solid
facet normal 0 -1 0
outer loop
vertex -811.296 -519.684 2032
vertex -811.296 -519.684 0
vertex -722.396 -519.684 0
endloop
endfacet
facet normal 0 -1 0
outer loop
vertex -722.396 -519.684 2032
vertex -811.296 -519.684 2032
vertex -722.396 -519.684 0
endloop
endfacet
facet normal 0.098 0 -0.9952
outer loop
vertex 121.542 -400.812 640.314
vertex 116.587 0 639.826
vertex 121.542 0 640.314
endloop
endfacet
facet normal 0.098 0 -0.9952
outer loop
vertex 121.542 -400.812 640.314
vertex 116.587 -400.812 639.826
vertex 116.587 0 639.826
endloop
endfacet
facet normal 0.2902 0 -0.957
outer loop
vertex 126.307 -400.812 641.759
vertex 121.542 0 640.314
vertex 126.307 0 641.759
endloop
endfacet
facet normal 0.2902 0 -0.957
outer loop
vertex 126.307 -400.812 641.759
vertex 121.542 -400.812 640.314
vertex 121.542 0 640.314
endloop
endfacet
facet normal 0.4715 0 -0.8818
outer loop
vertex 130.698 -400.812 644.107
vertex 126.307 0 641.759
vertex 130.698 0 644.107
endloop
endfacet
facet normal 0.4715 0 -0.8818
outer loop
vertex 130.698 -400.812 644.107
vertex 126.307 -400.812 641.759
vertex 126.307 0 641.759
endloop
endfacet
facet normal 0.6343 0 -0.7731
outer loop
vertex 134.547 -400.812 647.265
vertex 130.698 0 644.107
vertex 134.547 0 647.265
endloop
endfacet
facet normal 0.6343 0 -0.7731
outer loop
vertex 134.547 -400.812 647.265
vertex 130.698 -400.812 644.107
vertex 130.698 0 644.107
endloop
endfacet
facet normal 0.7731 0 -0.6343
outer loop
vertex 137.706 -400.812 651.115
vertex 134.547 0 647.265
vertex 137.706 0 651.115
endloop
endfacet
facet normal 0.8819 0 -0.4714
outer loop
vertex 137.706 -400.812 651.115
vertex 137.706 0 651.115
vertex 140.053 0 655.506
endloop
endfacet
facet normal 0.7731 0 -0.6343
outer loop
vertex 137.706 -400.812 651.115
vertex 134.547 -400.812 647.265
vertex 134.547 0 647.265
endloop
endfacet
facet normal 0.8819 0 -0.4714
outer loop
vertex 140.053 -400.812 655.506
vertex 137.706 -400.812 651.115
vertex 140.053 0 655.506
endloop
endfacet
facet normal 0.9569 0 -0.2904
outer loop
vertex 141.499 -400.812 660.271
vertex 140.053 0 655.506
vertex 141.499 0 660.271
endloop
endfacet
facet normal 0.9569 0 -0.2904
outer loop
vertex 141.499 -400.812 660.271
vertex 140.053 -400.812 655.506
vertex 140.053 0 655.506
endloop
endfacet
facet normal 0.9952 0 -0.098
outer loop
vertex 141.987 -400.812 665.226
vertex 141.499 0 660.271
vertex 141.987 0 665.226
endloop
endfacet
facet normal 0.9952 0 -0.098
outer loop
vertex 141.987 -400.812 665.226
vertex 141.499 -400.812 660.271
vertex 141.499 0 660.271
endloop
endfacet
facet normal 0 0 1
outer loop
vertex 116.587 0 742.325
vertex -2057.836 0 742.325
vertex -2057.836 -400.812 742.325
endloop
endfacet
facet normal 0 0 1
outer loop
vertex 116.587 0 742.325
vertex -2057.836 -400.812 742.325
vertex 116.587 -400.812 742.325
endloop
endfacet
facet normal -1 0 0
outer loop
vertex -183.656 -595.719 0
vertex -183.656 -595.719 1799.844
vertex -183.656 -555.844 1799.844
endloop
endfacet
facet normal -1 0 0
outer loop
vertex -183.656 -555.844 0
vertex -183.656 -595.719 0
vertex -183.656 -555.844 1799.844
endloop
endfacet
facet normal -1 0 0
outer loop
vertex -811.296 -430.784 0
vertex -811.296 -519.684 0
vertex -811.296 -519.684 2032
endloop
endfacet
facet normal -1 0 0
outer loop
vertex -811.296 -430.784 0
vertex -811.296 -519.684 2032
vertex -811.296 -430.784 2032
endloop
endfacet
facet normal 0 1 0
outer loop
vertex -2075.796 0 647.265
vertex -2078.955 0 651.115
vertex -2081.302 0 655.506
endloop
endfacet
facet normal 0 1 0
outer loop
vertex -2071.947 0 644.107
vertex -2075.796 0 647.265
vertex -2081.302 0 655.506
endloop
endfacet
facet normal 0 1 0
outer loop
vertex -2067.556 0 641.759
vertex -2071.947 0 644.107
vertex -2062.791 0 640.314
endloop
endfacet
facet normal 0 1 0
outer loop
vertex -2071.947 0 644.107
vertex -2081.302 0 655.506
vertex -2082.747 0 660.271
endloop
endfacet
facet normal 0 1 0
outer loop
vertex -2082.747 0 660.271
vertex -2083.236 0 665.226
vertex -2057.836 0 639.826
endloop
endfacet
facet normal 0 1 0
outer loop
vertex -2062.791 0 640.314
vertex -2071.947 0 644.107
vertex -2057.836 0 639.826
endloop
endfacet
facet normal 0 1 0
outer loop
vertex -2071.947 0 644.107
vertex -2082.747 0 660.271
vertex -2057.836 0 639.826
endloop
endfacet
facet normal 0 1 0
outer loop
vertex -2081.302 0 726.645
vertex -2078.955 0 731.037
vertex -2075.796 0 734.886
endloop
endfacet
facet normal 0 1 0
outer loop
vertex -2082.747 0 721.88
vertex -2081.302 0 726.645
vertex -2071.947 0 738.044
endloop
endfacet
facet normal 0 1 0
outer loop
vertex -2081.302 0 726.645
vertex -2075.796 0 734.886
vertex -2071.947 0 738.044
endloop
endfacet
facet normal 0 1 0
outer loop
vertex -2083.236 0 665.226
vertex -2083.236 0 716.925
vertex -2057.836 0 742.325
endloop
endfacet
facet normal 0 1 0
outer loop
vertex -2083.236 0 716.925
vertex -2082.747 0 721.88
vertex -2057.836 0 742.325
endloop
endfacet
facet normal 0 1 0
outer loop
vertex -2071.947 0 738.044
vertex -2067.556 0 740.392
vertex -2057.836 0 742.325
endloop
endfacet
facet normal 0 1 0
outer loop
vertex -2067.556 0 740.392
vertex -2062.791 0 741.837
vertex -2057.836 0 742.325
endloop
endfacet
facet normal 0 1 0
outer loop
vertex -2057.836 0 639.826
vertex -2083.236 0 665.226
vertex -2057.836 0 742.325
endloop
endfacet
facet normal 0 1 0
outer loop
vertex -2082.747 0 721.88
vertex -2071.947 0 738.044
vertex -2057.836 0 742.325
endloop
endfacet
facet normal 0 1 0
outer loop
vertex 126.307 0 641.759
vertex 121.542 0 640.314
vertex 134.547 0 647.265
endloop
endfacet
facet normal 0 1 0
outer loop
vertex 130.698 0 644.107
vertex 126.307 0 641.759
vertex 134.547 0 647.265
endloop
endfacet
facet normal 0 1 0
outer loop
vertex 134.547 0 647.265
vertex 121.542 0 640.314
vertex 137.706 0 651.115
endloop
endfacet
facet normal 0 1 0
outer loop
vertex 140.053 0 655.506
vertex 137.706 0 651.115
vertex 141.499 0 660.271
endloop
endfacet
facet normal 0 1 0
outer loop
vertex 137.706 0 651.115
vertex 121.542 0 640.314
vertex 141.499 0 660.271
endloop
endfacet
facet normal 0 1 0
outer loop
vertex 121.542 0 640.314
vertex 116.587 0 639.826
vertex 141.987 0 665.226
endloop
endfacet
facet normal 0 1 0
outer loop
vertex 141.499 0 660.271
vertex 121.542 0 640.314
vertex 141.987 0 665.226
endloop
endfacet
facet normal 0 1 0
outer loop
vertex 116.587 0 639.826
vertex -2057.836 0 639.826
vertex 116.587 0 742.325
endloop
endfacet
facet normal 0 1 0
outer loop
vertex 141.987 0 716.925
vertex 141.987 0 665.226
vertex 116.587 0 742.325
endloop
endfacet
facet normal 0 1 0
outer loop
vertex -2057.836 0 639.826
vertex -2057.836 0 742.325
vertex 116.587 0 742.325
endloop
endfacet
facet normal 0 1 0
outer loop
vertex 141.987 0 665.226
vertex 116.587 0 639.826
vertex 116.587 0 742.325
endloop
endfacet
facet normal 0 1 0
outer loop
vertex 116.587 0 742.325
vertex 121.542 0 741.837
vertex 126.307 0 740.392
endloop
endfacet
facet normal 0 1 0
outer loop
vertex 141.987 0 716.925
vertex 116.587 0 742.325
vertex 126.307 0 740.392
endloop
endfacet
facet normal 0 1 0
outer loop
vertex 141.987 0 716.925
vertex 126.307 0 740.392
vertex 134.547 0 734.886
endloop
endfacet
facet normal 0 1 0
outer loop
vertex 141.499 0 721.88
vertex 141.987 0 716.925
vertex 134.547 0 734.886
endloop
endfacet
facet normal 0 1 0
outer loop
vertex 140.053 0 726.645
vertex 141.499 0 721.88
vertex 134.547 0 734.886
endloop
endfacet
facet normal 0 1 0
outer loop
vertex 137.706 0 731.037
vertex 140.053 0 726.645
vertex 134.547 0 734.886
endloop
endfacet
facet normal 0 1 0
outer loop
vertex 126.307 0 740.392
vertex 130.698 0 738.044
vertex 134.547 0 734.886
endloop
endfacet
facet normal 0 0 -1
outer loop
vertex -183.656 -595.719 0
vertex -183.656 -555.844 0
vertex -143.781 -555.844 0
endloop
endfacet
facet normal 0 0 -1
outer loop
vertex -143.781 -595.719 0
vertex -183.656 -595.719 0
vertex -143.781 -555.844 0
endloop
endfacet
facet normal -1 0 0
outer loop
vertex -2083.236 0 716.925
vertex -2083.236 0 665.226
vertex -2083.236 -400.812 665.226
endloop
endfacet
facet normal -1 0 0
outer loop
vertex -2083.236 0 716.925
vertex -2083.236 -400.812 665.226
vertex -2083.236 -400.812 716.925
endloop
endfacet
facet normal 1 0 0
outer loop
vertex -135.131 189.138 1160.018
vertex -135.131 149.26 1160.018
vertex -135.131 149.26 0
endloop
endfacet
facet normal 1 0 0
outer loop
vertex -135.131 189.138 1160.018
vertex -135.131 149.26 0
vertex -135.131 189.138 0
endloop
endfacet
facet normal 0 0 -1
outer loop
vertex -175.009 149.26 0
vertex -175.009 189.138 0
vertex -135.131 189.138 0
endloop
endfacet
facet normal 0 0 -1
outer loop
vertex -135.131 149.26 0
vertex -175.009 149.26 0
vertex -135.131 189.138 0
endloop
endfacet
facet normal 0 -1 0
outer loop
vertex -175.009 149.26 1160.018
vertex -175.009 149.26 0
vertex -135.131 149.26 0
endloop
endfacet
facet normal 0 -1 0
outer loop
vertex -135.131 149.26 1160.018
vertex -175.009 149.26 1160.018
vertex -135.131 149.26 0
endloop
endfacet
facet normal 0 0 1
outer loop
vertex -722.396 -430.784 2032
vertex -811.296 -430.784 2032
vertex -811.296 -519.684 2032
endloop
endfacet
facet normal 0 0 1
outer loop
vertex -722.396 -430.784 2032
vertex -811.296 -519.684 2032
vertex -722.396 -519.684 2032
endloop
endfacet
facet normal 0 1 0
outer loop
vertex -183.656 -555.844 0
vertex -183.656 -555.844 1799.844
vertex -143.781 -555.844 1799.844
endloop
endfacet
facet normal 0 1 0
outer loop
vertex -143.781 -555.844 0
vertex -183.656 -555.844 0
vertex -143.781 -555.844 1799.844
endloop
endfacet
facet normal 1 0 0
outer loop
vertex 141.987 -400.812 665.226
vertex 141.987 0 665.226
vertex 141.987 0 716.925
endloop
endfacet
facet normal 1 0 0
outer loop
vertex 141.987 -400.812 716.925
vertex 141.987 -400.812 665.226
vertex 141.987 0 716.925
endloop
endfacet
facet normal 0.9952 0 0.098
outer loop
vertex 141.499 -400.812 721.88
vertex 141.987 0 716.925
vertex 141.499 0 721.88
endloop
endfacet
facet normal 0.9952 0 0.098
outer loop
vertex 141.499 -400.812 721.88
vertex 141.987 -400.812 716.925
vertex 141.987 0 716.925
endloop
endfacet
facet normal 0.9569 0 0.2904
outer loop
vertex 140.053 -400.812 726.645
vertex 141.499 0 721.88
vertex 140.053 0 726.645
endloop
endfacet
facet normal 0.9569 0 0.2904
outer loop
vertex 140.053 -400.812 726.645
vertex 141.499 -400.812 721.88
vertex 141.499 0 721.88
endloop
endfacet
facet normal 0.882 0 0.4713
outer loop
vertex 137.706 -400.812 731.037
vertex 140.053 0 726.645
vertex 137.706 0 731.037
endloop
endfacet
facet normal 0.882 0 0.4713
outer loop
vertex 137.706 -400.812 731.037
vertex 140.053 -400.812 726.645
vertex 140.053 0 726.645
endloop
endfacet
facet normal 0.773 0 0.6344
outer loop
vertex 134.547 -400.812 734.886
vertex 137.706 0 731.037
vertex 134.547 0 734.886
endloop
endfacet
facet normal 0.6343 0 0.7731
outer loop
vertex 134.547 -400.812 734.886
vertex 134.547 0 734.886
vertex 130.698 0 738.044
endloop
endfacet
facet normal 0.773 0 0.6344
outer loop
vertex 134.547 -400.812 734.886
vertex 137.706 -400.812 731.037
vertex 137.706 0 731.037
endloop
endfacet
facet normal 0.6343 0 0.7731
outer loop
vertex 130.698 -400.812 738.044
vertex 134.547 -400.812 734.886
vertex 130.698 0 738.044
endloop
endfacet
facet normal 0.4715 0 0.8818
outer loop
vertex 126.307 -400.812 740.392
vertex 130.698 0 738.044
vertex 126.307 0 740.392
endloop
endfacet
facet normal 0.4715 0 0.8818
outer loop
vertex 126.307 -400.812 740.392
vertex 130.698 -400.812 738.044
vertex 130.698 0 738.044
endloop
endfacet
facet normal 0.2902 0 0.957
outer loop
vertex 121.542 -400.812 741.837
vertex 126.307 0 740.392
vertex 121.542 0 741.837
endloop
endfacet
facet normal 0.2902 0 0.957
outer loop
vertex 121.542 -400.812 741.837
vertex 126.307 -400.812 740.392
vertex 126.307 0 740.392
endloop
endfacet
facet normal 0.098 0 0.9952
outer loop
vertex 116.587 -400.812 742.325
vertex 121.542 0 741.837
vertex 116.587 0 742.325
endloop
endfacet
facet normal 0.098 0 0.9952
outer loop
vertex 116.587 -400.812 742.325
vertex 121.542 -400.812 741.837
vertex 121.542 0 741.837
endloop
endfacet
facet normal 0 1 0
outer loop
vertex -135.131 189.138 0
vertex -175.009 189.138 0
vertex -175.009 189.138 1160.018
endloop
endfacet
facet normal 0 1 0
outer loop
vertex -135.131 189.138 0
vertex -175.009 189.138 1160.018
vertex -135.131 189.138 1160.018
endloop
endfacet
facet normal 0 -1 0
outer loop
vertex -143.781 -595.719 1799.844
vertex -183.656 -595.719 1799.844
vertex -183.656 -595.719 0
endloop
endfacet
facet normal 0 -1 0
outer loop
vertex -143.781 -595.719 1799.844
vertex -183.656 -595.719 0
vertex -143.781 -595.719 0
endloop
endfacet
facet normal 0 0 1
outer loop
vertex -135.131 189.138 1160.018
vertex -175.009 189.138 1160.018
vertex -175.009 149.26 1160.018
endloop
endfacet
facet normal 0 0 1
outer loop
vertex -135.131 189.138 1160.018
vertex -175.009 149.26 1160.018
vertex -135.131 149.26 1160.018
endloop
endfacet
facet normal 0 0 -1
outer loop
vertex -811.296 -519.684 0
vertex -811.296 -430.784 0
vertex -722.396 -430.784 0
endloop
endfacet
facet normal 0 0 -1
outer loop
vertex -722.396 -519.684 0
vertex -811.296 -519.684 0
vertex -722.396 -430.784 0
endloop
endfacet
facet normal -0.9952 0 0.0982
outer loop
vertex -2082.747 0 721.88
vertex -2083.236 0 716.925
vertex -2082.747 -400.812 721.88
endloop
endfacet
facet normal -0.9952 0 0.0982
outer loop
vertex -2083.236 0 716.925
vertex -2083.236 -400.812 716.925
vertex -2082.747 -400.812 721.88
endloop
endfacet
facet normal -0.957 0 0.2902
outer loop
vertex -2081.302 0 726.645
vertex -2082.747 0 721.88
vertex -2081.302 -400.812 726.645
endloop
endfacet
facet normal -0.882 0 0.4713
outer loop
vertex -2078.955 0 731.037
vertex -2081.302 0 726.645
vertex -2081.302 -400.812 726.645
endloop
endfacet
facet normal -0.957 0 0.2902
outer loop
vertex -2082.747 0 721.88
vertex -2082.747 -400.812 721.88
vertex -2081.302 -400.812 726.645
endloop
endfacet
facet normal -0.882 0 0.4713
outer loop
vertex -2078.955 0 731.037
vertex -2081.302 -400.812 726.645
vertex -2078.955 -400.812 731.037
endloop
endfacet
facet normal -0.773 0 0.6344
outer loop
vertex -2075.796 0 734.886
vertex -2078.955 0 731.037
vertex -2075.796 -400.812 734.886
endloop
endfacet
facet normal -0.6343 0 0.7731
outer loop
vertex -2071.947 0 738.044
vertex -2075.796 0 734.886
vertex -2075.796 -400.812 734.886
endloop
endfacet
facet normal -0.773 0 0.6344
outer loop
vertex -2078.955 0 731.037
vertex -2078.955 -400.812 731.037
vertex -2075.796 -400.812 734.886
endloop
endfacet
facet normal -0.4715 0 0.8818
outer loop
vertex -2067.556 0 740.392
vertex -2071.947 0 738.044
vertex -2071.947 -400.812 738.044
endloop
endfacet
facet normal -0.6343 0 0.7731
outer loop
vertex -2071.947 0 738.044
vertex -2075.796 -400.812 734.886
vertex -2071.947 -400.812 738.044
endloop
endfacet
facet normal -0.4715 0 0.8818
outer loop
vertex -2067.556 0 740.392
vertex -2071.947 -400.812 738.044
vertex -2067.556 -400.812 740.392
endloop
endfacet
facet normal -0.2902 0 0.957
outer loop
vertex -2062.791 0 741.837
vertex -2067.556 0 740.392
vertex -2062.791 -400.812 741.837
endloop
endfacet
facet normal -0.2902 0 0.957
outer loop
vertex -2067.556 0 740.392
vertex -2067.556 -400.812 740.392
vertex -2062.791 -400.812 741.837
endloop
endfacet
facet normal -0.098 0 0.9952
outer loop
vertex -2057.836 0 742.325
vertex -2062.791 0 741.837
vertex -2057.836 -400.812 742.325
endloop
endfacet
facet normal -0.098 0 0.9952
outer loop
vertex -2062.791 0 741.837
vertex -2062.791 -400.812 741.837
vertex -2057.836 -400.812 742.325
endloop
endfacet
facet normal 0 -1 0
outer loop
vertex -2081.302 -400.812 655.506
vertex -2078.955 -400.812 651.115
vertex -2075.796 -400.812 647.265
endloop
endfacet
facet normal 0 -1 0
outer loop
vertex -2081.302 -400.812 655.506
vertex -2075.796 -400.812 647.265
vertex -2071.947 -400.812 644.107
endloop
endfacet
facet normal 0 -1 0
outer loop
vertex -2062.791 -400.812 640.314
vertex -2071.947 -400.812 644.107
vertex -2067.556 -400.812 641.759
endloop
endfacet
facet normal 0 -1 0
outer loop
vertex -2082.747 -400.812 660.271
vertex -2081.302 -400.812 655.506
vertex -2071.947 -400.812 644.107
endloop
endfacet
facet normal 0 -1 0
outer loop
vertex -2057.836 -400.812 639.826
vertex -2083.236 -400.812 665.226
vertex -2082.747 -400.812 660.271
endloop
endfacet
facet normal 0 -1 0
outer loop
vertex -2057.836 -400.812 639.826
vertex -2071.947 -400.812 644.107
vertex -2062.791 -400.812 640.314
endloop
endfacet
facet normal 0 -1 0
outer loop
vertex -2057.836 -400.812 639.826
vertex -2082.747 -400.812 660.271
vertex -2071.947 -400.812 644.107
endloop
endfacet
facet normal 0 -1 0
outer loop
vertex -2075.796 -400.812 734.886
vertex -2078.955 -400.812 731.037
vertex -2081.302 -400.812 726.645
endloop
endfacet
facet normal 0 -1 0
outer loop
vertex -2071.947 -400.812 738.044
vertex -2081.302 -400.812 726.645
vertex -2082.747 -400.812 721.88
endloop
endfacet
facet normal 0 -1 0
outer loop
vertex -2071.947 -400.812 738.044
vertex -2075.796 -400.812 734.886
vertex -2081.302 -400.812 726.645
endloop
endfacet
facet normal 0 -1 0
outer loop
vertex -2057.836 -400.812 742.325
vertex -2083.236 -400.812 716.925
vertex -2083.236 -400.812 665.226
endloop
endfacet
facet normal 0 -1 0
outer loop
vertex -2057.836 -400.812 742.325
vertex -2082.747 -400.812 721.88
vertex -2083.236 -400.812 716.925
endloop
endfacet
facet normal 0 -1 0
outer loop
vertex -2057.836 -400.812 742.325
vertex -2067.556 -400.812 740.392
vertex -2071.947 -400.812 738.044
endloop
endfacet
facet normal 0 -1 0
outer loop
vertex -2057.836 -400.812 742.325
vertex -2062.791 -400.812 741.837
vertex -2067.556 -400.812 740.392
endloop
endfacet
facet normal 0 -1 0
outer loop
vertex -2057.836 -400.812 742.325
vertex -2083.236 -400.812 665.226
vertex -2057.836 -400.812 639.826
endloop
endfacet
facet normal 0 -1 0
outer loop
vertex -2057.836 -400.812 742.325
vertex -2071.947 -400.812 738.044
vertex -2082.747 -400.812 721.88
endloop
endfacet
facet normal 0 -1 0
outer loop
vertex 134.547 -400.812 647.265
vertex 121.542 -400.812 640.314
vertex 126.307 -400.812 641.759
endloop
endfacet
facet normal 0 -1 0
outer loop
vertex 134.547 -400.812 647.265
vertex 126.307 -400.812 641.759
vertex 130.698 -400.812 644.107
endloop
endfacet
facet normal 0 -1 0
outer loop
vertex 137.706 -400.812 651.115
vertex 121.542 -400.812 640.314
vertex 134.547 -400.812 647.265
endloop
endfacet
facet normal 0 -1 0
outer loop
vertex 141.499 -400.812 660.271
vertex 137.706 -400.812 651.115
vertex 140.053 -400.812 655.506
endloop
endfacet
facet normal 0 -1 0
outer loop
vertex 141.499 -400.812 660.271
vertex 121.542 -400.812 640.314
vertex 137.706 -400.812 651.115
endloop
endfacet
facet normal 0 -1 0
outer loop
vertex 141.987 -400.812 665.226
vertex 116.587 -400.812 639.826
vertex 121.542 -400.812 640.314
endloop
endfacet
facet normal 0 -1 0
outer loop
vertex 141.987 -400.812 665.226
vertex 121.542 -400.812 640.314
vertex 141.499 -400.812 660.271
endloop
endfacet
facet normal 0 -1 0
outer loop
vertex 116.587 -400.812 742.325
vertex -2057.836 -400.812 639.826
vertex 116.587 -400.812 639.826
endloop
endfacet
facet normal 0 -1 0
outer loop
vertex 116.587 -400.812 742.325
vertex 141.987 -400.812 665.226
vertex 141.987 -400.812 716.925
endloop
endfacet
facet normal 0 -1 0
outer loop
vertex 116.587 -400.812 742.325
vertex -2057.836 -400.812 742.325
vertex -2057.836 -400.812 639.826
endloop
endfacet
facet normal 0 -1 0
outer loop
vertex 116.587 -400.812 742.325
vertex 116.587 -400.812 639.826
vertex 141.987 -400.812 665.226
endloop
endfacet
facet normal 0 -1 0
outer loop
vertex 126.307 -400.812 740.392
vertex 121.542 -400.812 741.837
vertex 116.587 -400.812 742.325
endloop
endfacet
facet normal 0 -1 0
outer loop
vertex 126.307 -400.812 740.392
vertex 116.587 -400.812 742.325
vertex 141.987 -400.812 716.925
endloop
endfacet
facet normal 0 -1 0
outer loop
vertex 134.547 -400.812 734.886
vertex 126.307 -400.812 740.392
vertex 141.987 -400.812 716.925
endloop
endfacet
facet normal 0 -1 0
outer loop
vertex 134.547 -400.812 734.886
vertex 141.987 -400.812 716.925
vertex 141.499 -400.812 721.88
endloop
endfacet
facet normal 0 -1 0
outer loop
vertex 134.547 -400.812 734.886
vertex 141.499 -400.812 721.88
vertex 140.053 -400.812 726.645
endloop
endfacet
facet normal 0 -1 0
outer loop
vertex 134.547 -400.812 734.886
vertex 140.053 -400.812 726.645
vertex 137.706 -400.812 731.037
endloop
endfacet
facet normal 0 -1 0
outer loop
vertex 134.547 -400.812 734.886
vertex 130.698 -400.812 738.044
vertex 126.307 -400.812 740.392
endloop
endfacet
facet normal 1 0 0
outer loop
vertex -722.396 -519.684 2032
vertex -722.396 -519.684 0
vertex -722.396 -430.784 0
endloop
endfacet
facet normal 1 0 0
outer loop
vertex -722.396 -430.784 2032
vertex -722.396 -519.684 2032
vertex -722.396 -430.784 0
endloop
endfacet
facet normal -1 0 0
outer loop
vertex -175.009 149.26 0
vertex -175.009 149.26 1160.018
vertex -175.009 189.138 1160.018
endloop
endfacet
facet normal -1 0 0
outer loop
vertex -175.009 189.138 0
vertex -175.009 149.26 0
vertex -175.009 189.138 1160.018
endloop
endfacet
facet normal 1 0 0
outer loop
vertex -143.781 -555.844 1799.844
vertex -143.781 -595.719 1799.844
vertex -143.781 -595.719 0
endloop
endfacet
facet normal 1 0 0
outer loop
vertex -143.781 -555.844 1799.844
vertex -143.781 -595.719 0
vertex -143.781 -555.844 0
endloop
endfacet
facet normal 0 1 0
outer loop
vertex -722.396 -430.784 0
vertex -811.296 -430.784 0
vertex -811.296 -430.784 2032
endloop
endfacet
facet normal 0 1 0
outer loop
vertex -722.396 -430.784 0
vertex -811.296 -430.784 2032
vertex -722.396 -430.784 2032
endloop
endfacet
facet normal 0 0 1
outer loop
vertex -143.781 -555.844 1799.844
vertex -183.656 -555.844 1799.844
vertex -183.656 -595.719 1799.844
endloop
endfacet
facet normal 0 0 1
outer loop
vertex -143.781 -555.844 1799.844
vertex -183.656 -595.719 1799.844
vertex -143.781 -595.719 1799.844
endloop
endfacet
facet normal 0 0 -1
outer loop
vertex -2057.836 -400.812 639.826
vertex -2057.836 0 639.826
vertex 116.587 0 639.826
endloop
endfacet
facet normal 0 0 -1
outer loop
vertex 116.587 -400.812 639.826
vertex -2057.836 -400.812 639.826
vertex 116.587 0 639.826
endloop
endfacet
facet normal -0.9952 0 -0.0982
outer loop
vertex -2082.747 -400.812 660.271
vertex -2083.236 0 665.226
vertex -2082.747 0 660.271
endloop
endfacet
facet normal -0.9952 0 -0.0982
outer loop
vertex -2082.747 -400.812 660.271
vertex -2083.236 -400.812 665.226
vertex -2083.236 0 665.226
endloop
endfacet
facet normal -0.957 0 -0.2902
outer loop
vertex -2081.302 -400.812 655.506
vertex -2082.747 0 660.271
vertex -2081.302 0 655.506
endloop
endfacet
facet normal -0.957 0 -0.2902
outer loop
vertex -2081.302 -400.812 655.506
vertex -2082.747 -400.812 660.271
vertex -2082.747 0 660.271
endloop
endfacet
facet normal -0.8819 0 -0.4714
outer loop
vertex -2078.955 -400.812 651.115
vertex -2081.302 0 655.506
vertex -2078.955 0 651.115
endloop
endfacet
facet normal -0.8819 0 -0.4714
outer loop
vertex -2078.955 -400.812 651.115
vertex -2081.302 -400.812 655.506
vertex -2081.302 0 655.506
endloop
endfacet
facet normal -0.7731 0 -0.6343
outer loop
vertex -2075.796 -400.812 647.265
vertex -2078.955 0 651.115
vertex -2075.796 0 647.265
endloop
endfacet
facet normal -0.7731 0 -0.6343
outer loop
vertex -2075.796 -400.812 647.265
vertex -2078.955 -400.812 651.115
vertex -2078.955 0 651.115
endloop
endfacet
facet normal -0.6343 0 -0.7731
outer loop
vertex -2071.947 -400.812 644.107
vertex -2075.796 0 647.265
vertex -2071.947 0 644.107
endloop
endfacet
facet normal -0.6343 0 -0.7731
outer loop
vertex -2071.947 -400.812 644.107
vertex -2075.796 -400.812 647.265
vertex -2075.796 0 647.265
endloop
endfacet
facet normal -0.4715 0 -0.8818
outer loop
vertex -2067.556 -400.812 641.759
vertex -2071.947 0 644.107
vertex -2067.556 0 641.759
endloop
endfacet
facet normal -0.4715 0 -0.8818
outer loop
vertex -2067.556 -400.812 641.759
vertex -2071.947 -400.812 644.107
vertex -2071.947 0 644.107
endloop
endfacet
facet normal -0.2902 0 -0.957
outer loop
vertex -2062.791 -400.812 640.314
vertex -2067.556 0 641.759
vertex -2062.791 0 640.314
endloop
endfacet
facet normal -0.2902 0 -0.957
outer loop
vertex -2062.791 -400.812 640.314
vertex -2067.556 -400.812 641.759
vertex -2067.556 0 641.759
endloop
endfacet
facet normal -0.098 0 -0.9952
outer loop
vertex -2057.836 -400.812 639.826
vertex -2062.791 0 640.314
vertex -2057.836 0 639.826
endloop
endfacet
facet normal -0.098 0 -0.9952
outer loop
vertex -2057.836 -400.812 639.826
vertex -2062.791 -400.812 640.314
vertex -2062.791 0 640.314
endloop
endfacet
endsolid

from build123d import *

# Parameters (mm, degrees)
F0_W     = 88.9
F0_H     = 88.9
F1_DEPTH = 2032
F2_W     = 2225.222164
F2_H     = 102.499093
F3_DEPTH = 400.812
F4_R     = 25.4
F0_W_2   = 39.877746
F0_H_2   = 39.877975
F5_DEPTH = 1160.018
F0_W_3   = 39.87546
F0_H_3   = 39.87546
F6_DEPTH = 1799.844


with BuildPart() as f1:
    # F0 (on Top) → F1 (new body)
    with BuildSketch(Plane.XY):
        with Locations((-766.845588, -475.234)):
            Rectangle(F0_W, F0_H)
    extrude(amount=F1_DEPTH)


with BuildPart() as f3:
    # F2 (on Front) → F3 (new body)
    with BuildSketch(Plane.XZ):
        with Locations((-970.624469, 691.075546)):
            Rectangle(F2_W, F2_H)
    extrude(amount=F3_DEPTH)

    # F4
    f4_edges = [f3.edges().sort_by_distance(p)[0] for p in [
        (-2083.235551, -200.406, 742.325093),
        (141.986613, -200.406, 742.325093),
        (-2083.235551, -200.406, 639.826),
        (141.986613, -200.406, 639.826),
    ]]
    fillet(f4_edges, radius=F4_R)


with BuildPart() as f5:
    # F0 (on Top) → F5 (new body)
    with BuildSketch(Plane.XY):
        with Locations((-155.069677, 169.19905)):
            Rectangle(F0_W_2, F0_H_2)
    extrude(amount=F5_DEPTH)


with BuildPart() as f6:
    # F0 (on Top) → F6 (new body)
    with BuildSketch(Plane.XY):
        with Locations((-163.718322, -575.781667)):
            Rectangle(F0_W_3, F0_H_3)
    extrude(amount=F6_DEPTH)


solid = Compound([f1.part, f3.part, f5.part, f6.part])
